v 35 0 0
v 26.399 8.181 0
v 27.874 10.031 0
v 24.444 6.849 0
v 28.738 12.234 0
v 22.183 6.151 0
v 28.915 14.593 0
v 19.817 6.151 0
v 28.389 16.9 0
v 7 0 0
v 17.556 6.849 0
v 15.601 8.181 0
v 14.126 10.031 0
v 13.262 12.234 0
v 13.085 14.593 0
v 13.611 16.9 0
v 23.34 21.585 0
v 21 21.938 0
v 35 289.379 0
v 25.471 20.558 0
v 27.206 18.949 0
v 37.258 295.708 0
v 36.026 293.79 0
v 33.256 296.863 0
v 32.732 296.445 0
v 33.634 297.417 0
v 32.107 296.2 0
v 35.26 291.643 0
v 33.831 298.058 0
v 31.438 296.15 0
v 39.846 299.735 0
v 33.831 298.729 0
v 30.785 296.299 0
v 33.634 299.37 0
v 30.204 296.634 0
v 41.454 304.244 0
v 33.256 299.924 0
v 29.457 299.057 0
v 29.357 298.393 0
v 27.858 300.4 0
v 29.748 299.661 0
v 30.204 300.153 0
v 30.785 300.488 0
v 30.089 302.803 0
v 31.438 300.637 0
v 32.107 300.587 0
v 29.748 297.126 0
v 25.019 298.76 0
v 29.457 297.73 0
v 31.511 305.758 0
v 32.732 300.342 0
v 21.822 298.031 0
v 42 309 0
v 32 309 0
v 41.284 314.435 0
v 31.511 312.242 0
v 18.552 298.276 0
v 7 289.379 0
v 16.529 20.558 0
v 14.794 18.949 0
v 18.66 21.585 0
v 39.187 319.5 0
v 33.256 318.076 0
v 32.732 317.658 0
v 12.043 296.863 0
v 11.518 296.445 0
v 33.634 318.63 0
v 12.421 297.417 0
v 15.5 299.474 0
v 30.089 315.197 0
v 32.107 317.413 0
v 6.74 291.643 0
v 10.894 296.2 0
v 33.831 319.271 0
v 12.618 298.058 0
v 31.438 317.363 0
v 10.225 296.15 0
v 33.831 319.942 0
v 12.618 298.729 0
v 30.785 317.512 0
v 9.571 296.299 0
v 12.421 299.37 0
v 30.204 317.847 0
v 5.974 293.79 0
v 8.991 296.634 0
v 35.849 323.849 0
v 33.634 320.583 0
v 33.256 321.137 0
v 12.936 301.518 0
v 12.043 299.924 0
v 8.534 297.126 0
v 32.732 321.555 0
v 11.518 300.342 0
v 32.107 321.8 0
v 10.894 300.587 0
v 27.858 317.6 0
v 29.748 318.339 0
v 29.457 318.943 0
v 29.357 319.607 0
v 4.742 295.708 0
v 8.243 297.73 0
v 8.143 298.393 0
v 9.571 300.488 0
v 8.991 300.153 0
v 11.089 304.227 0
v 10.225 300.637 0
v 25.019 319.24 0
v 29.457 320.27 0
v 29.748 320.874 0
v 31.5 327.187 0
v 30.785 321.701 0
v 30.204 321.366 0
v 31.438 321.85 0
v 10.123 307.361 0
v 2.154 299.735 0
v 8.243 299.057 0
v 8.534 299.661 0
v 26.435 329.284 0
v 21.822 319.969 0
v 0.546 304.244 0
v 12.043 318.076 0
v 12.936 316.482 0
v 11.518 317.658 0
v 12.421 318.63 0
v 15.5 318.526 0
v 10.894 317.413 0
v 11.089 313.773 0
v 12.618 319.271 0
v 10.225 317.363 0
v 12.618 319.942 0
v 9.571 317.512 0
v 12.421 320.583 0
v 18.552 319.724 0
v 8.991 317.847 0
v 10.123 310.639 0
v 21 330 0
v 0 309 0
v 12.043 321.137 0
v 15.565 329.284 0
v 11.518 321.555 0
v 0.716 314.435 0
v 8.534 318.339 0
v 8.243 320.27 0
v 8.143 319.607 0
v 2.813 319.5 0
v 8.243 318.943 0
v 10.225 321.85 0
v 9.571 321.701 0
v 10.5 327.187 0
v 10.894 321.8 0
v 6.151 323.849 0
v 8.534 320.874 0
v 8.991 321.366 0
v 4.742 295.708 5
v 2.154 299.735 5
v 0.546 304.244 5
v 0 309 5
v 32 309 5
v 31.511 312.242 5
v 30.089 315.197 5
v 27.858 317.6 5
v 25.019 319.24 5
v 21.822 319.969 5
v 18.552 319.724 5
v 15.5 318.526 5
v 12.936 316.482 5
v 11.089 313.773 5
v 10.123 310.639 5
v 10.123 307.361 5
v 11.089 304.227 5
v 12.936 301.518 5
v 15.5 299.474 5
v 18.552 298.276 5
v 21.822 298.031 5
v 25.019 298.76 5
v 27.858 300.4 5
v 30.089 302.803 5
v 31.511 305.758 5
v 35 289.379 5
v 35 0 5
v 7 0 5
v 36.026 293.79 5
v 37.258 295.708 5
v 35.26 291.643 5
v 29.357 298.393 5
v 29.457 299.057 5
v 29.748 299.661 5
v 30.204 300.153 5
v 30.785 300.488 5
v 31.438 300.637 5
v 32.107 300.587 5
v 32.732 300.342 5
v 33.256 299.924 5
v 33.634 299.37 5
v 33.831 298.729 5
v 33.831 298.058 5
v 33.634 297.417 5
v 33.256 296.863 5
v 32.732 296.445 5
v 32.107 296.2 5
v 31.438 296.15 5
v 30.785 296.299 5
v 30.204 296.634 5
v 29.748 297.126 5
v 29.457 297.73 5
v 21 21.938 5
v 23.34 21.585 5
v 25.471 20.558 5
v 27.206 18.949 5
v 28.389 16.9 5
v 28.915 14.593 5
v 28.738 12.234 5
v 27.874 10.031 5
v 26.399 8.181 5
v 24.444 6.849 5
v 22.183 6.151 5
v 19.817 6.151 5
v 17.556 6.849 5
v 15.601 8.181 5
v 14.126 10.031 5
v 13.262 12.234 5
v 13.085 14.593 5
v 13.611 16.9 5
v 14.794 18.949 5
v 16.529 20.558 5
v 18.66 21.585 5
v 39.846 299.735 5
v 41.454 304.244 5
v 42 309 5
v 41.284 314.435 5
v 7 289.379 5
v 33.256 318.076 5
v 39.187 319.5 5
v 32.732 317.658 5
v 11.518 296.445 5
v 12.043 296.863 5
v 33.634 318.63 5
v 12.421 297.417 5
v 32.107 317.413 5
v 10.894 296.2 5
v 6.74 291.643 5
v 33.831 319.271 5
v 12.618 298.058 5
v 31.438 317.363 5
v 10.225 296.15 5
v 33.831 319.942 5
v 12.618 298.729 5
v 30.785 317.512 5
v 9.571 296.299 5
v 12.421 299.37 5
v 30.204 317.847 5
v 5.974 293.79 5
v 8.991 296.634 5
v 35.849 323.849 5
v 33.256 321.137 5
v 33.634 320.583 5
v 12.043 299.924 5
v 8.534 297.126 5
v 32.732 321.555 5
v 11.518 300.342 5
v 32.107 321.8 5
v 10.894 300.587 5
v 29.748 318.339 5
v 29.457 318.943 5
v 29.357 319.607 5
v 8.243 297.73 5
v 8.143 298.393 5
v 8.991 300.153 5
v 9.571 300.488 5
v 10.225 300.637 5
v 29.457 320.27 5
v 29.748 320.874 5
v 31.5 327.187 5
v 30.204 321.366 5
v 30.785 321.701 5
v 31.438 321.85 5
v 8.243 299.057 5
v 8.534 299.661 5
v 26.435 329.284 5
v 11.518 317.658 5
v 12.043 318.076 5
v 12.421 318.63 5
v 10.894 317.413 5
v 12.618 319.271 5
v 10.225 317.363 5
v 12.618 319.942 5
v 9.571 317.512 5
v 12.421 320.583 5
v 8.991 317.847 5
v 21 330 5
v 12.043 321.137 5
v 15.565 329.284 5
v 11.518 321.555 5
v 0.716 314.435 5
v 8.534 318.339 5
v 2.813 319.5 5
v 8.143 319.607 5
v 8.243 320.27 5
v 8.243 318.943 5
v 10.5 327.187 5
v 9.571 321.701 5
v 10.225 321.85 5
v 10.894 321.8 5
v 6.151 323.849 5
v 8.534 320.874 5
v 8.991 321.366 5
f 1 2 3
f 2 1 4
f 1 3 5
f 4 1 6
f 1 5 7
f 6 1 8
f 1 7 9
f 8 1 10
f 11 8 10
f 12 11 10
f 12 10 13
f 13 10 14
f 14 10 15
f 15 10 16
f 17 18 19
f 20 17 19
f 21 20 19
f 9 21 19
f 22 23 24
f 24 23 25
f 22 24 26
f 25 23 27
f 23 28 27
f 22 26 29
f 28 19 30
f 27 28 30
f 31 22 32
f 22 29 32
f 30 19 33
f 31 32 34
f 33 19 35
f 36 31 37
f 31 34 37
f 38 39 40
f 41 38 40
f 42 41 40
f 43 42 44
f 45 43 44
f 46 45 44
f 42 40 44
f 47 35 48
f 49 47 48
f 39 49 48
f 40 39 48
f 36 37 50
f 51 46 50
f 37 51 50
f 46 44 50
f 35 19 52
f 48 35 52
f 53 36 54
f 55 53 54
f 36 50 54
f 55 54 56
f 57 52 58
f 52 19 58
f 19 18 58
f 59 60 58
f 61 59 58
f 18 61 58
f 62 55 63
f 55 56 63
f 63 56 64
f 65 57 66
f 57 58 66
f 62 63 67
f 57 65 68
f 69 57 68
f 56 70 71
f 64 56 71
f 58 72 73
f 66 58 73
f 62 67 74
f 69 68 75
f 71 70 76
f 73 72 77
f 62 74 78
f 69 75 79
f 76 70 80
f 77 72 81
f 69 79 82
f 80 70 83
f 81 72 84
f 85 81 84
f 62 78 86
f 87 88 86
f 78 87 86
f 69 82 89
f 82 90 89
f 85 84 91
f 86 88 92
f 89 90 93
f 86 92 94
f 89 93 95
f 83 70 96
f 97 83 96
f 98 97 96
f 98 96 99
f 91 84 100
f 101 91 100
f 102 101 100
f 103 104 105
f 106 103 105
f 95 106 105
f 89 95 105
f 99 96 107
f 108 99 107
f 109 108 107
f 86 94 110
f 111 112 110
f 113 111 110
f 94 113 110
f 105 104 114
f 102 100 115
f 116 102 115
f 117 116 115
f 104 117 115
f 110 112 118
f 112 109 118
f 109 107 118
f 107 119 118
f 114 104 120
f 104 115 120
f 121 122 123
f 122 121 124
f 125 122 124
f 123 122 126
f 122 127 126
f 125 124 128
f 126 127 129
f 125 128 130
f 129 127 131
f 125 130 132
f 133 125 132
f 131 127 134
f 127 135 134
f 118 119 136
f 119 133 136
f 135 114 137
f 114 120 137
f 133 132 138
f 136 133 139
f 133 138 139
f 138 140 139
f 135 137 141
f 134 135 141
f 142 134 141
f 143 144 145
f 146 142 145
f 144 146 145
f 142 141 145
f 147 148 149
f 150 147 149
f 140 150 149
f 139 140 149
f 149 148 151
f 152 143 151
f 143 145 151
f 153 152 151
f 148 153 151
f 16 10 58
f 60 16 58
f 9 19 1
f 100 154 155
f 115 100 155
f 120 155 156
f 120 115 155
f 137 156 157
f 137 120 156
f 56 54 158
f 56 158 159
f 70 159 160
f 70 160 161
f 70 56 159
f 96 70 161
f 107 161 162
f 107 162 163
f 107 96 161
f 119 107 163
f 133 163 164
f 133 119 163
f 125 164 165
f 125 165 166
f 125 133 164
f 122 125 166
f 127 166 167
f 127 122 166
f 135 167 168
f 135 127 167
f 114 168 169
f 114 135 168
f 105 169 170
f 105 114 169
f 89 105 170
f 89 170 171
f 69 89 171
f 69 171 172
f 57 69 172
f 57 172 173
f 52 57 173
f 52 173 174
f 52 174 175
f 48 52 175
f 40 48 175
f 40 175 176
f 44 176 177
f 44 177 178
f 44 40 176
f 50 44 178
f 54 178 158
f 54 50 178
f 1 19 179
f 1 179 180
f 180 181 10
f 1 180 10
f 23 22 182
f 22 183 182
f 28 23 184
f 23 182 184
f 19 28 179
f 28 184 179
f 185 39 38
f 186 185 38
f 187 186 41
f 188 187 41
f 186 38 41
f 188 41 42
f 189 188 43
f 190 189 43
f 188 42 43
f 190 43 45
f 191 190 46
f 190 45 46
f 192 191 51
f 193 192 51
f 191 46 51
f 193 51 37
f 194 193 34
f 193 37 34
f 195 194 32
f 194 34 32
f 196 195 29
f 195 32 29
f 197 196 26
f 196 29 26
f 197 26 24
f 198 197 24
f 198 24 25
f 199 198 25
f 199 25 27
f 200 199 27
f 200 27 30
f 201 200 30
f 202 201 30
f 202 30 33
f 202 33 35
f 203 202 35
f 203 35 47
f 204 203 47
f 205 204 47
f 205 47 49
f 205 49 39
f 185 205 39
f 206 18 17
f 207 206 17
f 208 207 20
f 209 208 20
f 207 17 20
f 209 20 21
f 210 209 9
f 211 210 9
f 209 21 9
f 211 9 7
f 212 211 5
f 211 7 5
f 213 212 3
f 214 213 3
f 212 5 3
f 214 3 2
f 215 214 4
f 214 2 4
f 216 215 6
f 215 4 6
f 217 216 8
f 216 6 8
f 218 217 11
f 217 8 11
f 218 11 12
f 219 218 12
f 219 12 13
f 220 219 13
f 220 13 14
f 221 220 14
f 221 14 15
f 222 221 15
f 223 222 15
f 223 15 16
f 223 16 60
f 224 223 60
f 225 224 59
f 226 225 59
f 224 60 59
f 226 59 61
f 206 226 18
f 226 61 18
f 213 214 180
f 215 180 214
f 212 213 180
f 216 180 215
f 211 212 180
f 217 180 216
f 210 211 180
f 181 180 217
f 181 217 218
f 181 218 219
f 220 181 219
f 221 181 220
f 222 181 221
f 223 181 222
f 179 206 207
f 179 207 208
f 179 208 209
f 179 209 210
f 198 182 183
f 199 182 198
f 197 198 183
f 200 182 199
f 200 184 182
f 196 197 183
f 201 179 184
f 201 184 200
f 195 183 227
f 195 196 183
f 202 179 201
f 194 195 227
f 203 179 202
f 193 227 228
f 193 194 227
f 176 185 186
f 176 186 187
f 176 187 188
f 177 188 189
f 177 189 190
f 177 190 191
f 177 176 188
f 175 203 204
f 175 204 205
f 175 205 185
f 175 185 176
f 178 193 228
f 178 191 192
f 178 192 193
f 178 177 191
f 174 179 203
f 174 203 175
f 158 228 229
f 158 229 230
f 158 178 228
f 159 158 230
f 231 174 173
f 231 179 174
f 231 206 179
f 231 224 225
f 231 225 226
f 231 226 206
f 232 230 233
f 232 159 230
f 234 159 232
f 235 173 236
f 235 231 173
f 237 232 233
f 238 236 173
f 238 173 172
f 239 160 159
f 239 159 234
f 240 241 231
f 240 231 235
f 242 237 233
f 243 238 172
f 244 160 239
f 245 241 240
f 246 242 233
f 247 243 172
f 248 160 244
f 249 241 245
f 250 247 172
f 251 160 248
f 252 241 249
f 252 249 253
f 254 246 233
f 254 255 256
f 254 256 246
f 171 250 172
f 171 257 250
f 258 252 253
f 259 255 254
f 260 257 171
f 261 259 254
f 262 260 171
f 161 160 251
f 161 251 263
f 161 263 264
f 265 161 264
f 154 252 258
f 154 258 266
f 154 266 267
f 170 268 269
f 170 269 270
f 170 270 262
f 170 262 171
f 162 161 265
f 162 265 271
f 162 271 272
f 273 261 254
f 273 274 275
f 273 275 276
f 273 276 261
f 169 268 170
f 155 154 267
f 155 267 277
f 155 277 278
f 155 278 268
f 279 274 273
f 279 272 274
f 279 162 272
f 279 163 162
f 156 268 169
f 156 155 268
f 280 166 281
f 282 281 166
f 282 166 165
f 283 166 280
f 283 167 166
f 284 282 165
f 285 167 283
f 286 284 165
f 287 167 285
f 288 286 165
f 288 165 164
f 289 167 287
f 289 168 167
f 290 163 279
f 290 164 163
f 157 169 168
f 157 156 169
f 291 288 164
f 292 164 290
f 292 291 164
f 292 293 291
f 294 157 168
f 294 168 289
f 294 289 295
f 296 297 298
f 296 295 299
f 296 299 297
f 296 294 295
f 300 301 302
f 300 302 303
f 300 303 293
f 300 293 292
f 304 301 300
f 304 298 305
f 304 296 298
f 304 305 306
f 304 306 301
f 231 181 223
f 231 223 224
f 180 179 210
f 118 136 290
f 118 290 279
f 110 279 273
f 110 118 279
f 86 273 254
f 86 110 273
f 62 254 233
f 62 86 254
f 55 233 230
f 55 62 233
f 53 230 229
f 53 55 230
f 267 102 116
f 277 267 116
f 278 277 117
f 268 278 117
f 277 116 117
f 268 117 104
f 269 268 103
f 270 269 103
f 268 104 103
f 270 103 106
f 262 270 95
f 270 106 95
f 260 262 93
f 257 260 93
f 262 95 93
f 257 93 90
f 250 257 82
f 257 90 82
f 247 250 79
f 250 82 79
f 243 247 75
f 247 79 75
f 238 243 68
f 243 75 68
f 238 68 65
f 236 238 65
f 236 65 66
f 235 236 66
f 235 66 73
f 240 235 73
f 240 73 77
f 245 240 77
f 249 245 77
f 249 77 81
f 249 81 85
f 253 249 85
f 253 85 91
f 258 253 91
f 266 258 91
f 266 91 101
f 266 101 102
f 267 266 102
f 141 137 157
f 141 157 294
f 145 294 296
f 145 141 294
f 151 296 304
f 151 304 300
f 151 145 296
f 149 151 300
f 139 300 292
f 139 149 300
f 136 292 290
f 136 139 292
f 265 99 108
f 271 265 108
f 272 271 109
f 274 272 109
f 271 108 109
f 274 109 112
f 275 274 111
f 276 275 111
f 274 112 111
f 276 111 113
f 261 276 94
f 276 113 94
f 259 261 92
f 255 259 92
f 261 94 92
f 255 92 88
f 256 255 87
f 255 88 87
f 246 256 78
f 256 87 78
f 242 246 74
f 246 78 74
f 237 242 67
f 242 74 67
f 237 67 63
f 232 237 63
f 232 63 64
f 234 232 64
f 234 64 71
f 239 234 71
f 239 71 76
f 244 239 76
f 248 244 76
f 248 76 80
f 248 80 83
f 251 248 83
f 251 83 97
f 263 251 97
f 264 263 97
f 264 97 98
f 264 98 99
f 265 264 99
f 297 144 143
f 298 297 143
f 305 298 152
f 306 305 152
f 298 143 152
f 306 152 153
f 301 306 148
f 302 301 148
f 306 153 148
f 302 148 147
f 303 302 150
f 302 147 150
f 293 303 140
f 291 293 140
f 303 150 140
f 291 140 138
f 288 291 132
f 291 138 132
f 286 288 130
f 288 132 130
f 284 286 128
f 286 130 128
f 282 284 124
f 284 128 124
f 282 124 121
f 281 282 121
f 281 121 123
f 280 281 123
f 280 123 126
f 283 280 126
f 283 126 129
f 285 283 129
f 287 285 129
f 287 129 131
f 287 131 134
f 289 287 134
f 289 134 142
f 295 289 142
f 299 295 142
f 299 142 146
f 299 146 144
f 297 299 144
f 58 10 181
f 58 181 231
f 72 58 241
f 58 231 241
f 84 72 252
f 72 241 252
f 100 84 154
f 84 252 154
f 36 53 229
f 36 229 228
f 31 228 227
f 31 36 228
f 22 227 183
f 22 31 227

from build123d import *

# Parameters (mm, degrees)
SKETCH1_W              = 5
SKETCH1_H              = 330
BOSS_EXTRUDE1_DEPTH    = 42
CUT_EXTRUDE1_START     = -5
CUT_EXTRUDE1_OUTLINE_R = 11
CUT_EXTRUDE1_DEPTH     = 5
M4_CLEARANCE_HOLE1_D   = 4.5
CUT_EXTRUDE3_DEPTH     = 5
FILLET2_R              = 10
SKETCH10_R             = 7.9375
CUT_EXTRUDE4_DEPTH     = 5


# Read off the part's stored shape, not the designer's step: Cut-Extrude1
with BuildPart() as part:
    # Sketch1 → Boss-Extrude1 (new body)
    with BuildSketch(Plane(origin=(0, 0, 0), x_dir=(0, 0, -1), z_dir=(1, 0, 0))):
        with Locations((-2.5, 165)):
            Rectangle(SKETCH1_W, SKETCH1_H)
    extrude(amount=BOSS_EXTRUDE1_DEPTH)

    # Cut-Extrude1 outline → Cut-Extrude1 (cut)
    with BuildSketch(Plane.XY.offset(5).offset(CUT_EXTRUDE1_START)):
        with BuildLine():
            ThreePointArc((0, 309), (6.150757595, 323.849242405), (21, 330))
            Line((21, 330), (0, 330))
            Line((0, 330), (0, 309))
        make_face()
        with BuildLine():
            ThreePointArc((21, 330), (35.849242405, 323.849242405), (42, 309))
            Line((42, 309), (42, 330))
            Line((42, 330), (21, 330))
        make_face()
        with Locations((21, 309)):
            Circle(CUT_EXTRUDE1_OUTLINE_R)
    extrude(amount=CUT_EXTRUDE1_DEPTH, mode=Mode.SUBTRACT)

    # M4 Clearance Hole1 (through all)
    with Locations(Plane.XY.offset(5)):
        with Locations((10.393398282, 319.606601718), (31.606601718, 319.606601718), (31.606601718, 298.393398282), (10.393398282, 298.393398282)):
            Hole(M4_CLEARANCE_HOLE1_D / 2)

    # Sketch9 → Cut-Extrude3 (cut)
    with BuildSketch(Plane(origin=(0, 0, 0), x_dir=(-1, 0, 0), z_dir=(0, 0, -1))):
        with BuildLine():
            Line((-35, 293.347524158), (-35, 0))
            Line((-35, 0), (-42, 0))
            Line((-42, 0), (-42, 309))
            ThreePointArc((-42, 309), (-40.170289513, 300.4267859), (-35, 293.347524158))
        make_face()
        with BuildLine():
            Line((-7, 0), (-7, 293.347524158))
            ThreePointArc((-7, 293.347524158), (-1.829710487, 300.4267859), (0, 309))
            Line((0, 309), (0, 0))
            Line((0, 0), (-7, 0))
        make_face()
    extrude(amount=-CUT_EXTRUDE3_DEPTH, mode=Mode.SUBTRACT)

    # Fillet2
    fillet2_edges = [part.edges().sort_by_distance(p)[0] for p in [
        (35, 293.347524158, 2.5),
        (7, 293.347524158, 2.5),
    ]]
    fillet(fillet2_edges, radius=FILLET2_R)

    # Sketch10 → Cut-Extrude4 (cut)
    with BuildSketch(Plane(origin=(0, 0, 0), x_dir=(-1, 0, 0), z_dir=(0, 0, -1))):
        with Locations(Location((-21, 14, 0), (0, 0, 90))):
            Circle(SKETCH10_R)
    extrude(amount=-CUT_EXTRUDE4_DEPTH, mode=Mode.SUBTRACT)


solid = part.part
